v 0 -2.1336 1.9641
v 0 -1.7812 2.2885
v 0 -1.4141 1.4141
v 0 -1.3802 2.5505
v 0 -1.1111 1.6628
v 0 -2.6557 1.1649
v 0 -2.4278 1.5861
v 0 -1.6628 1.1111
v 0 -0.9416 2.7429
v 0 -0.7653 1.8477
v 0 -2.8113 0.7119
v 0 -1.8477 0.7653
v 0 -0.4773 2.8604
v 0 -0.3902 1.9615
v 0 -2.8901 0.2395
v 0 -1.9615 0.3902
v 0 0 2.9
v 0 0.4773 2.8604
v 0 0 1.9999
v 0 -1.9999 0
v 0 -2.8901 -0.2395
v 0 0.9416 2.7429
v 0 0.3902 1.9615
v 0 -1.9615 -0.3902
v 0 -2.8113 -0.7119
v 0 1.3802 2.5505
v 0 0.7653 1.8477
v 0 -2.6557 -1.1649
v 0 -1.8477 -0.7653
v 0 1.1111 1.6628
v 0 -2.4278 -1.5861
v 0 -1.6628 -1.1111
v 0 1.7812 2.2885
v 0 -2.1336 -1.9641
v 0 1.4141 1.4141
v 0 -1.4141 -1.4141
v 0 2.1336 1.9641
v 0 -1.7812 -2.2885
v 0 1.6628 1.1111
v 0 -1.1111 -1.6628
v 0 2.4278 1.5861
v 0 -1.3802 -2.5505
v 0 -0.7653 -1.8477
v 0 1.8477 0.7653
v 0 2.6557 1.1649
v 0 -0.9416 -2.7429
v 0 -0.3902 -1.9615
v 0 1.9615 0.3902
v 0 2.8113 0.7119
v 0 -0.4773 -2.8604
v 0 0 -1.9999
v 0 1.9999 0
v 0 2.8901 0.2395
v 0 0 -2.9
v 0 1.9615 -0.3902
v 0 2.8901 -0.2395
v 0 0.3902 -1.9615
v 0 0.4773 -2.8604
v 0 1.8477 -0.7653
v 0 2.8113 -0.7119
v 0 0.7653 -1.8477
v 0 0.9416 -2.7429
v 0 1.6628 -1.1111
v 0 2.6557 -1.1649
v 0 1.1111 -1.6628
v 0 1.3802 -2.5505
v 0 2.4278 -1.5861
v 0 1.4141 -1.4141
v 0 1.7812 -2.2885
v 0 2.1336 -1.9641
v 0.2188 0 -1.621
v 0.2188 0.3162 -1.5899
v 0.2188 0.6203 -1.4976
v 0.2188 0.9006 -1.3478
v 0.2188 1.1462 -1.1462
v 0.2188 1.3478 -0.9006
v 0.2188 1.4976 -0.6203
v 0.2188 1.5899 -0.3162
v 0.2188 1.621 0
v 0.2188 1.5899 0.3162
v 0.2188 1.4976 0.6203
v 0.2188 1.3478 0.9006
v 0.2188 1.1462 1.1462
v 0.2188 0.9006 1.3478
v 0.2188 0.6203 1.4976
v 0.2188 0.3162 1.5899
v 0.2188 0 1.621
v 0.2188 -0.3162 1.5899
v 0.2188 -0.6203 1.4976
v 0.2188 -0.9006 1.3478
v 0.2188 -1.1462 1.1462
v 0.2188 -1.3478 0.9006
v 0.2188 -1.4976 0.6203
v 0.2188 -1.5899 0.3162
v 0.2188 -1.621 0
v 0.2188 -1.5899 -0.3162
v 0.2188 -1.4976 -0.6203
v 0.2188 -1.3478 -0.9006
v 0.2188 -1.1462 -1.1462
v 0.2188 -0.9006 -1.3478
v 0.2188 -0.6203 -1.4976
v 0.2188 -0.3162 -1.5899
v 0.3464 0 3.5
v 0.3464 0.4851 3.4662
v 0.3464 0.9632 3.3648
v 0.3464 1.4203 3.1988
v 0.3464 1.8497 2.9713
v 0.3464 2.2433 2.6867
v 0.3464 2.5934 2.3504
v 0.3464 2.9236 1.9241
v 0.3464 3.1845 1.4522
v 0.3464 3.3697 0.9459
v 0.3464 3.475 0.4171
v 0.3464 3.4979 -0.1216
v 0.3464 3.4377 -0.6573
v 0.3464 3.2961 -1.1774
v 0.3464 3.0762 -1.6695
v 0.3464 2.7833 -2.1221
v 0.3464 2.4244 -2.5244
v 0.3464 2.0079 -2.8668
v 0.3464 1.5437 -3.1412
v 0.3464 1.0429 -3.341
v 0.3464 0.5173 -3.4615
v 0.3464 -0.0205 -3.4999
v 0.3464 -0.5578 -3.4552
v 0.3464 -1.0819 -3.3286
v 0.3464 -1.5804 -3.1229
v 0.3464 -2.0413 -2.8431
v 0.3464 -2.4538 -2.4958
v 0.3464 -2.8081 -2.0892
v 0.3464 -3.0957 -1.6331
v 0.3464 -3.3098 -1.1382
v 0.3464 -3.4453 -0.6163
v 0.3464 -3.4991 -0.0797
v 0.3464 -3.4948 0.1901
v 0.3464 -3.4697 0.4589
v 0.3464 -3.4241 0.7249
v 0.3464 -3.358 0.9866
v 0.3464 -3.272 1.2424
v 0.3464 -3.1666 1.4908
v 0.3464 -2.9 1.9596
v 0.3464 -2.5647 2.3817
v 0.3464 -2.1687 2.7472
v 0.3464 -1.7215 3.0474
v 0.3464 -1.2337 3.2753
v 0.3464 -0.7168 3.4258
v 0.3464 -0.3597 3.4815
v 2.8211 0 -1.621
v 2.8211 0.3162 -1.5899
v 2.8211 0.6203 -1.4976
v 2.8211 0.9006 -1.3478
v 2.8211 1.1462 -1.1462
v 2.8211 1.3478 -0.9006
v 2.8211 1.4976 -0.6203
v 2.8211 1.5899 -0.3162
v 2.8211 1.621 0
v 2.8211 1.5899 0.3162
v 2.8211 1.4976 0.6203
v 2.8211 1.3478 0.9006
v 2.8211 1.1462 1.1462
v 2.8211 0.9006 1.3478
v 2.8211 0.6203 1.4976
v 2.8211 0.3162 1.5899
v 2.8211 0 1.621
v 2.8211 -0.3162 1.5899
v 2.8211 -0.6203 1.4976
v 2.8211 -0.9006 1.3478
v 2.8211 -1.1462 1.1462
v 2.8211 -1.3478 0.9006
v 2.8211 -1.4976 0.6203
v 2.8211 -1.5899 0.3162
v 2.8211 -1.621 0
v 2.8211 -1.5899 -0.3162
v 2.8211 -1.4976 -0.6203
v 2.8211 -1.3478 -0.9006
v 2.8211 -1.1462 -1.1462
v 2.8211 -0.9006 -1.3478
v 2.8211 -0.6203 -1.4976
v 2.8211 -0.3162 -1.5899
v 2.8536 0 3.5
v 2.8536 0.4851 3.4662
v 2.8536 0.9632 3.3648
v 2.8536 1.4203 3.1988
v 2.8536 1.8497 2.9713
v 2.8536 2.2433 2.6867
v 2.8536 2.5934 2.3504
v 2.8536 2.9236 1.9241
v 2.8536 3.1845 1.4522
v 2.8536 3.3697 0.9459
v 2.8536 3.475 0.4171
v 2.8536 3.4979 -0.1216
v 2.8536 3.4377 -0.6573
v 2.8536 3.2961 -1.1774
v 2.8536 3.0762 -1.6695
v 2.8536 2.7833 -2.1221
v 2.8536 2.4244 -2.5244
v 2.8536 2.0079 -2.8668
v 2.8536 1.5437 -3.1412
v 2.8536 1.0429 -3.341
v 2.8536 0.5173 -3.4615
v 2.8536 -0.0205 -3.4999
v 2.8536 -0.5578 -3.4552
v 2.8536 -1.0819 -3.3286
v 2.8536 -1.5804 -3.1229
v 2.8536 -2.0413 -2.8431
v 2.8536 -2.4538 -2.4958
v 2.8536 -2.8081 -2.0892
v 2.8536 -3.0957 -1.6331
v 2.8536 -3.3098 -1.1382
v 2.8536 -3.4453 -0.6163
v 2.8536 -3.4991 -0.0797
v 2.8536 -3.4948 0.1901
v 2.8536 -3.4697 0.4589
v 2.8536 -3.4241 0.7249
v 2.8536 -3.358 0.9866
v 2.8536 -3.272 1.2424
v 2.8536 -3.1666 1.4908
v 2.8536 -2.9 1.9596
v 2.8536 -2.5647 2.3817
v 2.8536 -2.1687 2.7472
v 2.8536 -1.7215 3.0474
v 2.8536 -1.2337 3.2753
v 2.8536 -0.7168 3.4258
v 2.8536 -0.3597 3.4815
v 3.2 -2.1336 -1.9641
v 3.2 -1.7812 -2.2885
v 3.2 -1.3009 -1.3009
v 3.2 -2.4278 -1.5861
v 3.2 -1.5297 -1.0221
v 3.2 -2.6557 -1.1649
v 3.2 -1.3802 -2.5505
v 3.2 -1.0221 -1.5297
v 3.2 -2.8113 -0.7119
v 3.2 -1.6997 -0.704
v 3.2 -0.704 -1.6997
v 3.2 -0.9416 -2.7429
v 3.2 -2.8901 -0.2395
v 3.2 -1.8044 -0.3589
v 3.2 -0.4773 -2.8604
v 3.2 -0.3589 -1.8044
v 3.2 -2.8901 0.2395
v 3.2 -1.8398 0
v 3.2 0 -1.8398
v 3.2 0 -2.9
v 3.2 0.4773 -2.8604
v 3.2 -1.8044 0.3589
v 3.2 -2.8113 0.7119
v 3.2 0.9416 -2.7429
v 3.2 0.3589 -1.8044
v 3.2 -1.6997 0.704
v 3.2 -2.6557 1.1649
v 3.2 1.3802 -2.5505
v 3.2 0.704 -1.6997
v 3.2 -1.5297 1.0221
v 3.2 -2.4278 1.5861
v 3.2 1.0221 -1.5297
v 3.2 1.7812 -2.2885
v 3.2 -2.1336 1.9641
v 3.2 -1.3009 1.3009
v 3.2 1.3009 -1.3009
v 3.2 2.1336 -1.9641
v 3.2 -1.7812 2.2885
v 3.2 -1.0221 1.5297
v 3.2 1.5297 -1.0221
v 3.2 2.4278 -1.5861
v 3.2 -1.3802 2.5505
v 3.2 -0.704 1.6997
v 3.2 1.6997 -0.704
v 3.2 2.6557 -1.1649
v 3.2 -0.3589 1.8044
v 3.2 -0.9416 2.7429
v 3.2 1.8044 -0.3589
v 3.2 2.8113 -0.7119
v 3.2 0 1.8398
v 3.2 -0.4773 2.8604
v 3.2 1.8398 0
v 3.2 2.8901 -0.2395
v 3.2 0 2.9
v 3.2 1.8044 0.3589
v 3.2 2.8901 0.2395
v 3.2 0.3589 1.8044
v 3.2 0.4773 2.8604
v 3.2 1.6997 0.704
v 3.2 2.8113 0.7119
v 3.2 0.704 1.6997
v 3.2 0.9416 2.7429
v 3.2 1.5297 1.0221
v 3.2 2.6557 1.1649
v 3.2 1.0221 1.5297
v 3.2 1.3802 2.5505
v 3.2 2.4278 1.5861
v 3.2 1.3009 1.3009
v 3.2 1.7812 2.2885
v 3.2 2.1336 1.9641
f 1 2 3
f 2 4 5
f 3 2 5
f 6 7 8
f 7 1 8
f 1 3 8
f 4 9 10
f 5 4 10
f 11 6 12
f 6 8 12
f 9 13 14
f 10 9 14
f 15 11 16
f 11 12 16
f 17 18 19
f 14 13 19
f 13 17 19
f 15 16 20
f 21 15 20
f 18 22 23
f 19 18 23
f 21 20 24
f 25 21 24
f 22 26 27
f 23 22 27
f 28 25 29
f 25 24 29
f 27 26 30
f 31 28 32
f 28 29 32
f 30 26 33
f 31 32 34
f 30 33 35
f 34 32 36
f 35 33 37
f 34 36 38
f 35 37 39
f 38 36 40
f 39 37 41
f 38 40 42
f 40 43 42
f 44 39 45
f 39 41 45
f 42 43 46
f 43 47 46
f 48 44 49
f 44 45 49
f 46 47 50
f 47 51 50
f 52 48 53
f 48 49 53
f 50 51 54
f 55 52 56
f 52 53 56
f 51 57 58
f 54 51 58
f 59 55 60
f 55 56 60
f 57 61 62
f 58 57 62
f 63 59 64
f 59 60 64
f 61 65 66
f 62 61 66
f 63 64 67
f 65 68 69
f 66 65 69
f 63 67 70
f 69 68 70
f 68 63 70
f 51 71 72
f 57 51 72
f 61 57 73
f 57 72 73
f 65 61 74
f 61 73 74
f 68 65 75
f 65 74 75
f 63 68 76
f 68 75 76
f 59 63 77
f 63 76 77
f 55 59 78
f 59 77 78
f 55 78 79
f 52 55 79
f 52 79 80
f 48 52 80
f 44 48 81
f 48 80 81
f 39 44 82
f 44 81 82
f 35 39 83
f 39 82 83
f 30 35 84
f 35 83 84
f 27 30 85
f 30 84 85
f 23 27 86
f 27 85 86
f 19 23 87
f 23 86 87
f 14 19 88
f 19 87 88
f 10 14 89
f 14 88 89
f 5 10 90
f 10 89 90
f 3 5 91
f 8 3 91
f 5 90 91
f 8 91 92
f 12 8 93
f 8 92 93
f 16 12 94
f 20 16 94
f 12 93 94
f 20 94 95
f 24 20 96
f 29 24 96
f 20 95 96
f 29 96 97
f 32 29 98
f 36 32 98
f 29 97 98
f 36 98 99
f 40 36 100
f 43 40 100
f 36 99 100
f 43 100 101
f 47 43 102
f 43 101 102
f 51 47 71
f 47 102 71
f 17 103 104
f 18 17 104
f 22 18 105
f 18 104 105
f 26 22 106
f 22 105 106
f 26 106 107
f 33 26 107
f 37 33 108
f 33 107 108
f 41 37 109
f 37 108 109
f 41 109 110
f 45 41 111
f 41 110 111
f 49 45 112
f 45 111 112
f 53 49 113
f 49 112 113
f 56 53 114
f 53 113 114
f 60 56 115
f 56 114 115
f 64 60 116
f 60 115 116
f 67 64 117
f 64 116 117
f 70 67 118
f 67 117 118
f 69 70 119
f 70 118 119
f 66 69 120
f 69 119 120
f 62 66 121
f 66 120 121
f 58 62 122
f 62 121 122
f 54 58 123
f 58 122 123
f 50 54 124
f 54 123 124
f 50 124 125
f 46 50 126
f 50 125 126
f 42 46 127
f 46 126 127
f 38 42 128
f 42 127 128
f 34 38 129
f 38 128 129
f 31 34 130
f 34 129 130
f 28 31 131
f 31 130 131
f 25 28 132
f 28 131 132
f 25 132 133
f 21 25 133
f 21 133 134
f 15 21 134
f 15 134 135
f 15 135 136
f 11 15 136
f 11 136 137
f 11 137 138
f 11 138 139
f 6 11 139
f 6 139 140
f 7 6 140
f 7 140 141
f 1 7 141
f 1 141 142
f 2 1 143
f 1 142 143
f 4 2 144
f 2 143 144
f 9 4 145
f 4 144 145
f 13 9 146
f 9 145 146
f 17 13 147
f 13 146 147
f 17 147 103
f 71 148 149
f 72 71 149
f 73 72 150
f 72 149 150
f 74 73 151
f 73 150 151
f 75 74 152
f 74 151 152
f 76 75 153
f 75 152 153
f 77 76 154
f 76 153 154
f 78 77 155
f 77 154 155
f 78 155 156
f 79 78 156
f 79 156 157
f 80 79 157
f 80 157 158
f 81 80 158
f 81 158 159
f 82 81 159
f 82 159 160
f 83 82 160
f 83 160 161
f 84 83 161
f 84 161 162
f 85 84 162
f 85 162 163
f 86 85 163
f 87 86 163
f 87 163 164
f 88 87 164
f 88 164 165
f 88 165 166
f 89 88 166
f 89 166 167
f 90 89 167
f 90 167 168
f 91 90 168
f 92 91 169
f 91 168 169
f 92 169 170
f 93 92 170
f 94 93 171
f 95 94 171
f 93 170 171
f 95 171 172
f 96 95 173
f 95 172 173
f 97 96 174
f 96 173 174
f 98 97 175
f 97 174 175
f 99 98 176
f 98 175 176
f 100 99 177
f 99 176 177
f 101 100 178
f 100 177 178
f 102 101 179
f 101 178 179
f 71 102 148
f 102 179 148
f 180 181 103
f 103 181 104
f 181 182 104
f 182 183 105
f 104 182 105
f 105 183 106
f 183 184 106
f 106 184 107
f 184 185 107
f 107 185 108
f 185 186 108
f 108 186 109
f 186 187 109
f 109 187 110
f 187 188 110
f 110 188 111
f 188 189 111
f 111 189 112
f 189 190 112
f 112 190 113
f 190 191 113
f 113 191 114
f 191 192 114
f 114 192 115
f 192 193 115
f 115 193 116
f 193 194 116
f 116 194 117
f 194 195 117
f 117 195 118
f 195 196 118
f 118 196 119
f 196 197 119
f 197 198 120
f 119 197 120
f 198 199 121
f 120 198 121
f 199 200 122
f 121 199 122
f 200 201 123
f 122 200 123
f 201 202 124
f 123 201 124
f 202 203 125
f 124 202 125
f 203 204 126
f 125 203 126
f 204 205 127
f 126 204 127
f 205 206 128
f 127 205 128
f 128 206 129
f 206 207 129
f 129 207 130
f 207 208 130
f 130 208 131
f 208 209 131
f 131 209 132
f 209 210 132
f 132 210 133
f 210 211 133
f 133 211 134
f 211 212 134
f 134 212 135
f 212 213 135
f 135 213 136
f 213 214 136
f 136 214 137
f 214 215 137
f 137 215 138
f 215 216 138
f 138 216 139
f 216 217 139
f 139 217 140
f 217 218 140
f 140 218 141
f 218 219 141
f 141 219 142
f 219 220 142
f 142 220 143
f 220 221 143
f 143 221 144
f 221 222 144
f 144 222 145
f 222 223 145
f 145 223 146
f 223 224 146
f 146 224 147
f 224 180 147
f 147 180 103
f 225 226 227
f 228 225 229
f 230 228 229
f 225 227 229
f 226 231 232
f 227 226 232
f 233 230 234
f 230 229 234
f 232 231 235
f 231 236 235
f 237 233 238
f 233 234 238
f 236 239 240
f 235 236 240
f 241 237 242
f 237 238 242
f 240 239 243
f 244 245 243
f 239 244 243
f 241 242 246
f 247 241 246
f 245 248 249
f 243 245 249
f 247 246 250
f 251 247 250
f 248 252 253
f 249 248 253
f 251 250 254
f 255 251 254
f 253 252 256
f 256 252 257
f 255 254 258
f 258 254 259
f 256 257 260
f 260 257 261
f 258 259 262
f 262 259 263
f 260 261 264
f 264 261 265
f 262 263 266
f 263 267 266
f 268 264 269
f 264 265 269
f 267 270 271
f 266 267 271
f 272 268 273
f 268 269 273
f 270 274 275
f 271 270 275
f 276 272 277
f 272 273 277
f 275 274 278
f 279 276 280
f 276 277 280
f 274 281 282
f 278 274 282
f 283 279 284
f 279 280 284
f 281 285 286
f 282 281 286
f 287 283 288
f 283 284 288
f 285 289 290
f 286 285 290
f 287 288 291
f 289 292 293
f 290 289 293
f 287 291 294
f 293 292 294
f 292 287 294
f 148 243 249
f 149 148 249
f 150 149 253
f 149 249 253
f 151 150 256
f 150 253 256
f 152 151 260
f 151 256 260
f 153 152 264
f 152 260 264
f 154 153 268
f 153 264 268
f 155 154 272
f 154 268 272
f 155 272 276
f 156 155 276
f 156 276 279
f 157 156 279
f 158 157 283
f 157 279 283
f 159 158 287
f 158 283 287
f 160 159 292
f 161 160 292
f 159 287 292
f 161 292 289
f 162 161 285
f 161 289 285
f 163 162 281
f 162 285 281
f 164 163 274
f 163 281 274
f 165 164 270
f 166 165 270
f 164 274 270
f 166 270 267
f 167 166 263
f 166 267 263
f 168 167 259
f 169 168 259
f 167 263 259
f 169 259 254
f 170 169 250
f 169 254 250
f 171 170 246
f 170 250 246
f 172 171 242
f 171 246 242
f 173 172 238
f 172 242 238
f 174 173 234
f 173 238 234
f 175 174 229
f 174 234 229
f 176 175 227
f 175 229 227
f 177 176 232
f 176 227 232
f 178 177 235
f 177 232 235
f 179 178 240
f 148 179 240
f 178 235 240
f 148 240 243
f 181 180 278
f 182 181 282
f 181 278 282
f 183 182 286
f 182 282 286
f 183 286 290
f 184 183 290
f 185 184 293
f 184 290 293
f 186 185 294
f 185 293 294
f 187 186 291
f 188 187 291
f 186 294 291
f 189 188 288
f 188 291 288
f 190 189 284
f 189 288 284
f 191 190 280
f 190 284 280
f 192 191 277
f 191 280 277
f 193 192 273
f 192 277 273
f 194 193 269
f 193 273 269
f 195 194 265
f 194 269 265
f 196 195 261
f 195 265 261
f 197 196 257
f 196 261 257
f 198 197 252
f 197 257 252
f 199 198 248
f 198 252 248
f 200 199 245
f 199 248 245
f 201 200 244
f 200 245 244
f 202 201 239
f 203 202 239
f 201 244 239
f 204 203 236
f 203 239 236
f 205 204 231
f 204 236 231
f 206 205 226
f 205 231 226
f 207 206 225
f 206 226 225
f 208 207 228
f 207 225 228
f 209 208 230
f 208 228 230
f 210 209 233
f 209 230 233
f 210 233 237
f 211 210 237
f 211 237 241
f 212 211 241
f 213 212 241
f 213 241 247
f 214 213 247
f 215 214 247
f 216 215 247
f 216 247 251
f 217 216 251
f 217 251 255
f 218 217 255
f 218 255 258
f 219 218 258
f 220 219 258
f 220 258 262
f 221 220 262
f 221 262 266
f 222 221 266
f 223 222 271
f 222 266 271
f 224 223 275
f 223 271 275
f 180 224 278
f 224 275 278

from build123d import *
from OCP.BRepFilletAPI import BRepFilletAPI_MakeChamfer

# Parameters (mm, degrees)
M3_CLEARANCE_HOLE1_D = 3.242
CHAMFER1_SIZE        = 0.378886114
CHAMFER1_SIZE2       = 0.21875
CHAMFER2_SIZE        = 2.507183156
CHAMFER2_SIZE2       = 2.507184174


with BuildPart() as part:
    # Sketch1 → Revolve1 (revolve)
    with BuildSketch(Plane(origin=(0, 0, 0), x_dir=(-1, 0, 0), z_dir=(0, 0, -1)), mode=Mode.PRIVATE) as revolve1_sk:
        Polygon((-3.2, 2.9), (-3.2, 0), (0, 0), (0, 2.9), (-1.6, 5.671281292), align=None)
    revolve(revolve1_sk.sketch.rotate(Axis((3.2, 0, 0), (-1, 0, 0)), 270), axis=Axis((3.2, 0, 0), (-1, 0, 0)))

    # M3 Clearance Hole1 (through all)
    with Locations(Plane.ZY):
        with Locations((0, 0)):
            Hole(M3_CLEARANCE_HOLE1_D / 2)

    # Chamfer1: one chamfer whose edges measure the first distance from different faces: ONE call of the kernel's chamfer builder (chamfer() names one face for all edges)
    chamfer1_edges_1 = [part.edges().sort_by_distance(p)[0] for p in [
        (0, 0, 1.621),
    ]]
    chamfer1_side_1 = [part.faces().sort_by_distance(p)[0] for p in [
        (0, 0, -2.817975613),
    ]]
    chamfer1_edges_2 = [part.edges().sort_by_distance(p)[0] for p in [
        (3.2, 0, 1.621),
    ]]
    chamfer1_side_2 = [part.faces().sort_by_distance(p)[0] for p in [
        (1.6, 0, 1.621),
    ]]
    chamfer1 = BRepFilletAPI_MakeChamfer(part.part.solid().wrapped)
    for e in chamfer1_edges_1:
        chamfer1.Add(CHAMFER1_SIZE, CHAMFER1_SIZE2, e.wrapped, chamfer1_side_1[0].wrapped)  # the first distance lies on this face
    for e in chamfer1_edges_2:
        chamfer1.Add(CHAMFER1_SIZE, CHAMFER1_SIZE2, e.wrapped, chamfer1_side_2[0].wrapped)  # the first distance lies on this face
    add(Compound.cast(chamfer1.Shape()), mode=Mode.REPLACE)

    # Chamfer2
    chamfer2_edges = [part.edges().sort_by_distance(p)[0] for p in [
        (1.6, 0, -5.671281292),
    ]]
    chamfer2_side = [part.faces().sort_by_distance(p)[0] for p in [
        (2.4, 0, -4.285640646),
    ]]
    chamfer(chamfer2_edges, length=CHAMFER2_SIZE, length2=CHAMFER2_SIZE2, reference=chamfer2_side[0])


solid = part.part
